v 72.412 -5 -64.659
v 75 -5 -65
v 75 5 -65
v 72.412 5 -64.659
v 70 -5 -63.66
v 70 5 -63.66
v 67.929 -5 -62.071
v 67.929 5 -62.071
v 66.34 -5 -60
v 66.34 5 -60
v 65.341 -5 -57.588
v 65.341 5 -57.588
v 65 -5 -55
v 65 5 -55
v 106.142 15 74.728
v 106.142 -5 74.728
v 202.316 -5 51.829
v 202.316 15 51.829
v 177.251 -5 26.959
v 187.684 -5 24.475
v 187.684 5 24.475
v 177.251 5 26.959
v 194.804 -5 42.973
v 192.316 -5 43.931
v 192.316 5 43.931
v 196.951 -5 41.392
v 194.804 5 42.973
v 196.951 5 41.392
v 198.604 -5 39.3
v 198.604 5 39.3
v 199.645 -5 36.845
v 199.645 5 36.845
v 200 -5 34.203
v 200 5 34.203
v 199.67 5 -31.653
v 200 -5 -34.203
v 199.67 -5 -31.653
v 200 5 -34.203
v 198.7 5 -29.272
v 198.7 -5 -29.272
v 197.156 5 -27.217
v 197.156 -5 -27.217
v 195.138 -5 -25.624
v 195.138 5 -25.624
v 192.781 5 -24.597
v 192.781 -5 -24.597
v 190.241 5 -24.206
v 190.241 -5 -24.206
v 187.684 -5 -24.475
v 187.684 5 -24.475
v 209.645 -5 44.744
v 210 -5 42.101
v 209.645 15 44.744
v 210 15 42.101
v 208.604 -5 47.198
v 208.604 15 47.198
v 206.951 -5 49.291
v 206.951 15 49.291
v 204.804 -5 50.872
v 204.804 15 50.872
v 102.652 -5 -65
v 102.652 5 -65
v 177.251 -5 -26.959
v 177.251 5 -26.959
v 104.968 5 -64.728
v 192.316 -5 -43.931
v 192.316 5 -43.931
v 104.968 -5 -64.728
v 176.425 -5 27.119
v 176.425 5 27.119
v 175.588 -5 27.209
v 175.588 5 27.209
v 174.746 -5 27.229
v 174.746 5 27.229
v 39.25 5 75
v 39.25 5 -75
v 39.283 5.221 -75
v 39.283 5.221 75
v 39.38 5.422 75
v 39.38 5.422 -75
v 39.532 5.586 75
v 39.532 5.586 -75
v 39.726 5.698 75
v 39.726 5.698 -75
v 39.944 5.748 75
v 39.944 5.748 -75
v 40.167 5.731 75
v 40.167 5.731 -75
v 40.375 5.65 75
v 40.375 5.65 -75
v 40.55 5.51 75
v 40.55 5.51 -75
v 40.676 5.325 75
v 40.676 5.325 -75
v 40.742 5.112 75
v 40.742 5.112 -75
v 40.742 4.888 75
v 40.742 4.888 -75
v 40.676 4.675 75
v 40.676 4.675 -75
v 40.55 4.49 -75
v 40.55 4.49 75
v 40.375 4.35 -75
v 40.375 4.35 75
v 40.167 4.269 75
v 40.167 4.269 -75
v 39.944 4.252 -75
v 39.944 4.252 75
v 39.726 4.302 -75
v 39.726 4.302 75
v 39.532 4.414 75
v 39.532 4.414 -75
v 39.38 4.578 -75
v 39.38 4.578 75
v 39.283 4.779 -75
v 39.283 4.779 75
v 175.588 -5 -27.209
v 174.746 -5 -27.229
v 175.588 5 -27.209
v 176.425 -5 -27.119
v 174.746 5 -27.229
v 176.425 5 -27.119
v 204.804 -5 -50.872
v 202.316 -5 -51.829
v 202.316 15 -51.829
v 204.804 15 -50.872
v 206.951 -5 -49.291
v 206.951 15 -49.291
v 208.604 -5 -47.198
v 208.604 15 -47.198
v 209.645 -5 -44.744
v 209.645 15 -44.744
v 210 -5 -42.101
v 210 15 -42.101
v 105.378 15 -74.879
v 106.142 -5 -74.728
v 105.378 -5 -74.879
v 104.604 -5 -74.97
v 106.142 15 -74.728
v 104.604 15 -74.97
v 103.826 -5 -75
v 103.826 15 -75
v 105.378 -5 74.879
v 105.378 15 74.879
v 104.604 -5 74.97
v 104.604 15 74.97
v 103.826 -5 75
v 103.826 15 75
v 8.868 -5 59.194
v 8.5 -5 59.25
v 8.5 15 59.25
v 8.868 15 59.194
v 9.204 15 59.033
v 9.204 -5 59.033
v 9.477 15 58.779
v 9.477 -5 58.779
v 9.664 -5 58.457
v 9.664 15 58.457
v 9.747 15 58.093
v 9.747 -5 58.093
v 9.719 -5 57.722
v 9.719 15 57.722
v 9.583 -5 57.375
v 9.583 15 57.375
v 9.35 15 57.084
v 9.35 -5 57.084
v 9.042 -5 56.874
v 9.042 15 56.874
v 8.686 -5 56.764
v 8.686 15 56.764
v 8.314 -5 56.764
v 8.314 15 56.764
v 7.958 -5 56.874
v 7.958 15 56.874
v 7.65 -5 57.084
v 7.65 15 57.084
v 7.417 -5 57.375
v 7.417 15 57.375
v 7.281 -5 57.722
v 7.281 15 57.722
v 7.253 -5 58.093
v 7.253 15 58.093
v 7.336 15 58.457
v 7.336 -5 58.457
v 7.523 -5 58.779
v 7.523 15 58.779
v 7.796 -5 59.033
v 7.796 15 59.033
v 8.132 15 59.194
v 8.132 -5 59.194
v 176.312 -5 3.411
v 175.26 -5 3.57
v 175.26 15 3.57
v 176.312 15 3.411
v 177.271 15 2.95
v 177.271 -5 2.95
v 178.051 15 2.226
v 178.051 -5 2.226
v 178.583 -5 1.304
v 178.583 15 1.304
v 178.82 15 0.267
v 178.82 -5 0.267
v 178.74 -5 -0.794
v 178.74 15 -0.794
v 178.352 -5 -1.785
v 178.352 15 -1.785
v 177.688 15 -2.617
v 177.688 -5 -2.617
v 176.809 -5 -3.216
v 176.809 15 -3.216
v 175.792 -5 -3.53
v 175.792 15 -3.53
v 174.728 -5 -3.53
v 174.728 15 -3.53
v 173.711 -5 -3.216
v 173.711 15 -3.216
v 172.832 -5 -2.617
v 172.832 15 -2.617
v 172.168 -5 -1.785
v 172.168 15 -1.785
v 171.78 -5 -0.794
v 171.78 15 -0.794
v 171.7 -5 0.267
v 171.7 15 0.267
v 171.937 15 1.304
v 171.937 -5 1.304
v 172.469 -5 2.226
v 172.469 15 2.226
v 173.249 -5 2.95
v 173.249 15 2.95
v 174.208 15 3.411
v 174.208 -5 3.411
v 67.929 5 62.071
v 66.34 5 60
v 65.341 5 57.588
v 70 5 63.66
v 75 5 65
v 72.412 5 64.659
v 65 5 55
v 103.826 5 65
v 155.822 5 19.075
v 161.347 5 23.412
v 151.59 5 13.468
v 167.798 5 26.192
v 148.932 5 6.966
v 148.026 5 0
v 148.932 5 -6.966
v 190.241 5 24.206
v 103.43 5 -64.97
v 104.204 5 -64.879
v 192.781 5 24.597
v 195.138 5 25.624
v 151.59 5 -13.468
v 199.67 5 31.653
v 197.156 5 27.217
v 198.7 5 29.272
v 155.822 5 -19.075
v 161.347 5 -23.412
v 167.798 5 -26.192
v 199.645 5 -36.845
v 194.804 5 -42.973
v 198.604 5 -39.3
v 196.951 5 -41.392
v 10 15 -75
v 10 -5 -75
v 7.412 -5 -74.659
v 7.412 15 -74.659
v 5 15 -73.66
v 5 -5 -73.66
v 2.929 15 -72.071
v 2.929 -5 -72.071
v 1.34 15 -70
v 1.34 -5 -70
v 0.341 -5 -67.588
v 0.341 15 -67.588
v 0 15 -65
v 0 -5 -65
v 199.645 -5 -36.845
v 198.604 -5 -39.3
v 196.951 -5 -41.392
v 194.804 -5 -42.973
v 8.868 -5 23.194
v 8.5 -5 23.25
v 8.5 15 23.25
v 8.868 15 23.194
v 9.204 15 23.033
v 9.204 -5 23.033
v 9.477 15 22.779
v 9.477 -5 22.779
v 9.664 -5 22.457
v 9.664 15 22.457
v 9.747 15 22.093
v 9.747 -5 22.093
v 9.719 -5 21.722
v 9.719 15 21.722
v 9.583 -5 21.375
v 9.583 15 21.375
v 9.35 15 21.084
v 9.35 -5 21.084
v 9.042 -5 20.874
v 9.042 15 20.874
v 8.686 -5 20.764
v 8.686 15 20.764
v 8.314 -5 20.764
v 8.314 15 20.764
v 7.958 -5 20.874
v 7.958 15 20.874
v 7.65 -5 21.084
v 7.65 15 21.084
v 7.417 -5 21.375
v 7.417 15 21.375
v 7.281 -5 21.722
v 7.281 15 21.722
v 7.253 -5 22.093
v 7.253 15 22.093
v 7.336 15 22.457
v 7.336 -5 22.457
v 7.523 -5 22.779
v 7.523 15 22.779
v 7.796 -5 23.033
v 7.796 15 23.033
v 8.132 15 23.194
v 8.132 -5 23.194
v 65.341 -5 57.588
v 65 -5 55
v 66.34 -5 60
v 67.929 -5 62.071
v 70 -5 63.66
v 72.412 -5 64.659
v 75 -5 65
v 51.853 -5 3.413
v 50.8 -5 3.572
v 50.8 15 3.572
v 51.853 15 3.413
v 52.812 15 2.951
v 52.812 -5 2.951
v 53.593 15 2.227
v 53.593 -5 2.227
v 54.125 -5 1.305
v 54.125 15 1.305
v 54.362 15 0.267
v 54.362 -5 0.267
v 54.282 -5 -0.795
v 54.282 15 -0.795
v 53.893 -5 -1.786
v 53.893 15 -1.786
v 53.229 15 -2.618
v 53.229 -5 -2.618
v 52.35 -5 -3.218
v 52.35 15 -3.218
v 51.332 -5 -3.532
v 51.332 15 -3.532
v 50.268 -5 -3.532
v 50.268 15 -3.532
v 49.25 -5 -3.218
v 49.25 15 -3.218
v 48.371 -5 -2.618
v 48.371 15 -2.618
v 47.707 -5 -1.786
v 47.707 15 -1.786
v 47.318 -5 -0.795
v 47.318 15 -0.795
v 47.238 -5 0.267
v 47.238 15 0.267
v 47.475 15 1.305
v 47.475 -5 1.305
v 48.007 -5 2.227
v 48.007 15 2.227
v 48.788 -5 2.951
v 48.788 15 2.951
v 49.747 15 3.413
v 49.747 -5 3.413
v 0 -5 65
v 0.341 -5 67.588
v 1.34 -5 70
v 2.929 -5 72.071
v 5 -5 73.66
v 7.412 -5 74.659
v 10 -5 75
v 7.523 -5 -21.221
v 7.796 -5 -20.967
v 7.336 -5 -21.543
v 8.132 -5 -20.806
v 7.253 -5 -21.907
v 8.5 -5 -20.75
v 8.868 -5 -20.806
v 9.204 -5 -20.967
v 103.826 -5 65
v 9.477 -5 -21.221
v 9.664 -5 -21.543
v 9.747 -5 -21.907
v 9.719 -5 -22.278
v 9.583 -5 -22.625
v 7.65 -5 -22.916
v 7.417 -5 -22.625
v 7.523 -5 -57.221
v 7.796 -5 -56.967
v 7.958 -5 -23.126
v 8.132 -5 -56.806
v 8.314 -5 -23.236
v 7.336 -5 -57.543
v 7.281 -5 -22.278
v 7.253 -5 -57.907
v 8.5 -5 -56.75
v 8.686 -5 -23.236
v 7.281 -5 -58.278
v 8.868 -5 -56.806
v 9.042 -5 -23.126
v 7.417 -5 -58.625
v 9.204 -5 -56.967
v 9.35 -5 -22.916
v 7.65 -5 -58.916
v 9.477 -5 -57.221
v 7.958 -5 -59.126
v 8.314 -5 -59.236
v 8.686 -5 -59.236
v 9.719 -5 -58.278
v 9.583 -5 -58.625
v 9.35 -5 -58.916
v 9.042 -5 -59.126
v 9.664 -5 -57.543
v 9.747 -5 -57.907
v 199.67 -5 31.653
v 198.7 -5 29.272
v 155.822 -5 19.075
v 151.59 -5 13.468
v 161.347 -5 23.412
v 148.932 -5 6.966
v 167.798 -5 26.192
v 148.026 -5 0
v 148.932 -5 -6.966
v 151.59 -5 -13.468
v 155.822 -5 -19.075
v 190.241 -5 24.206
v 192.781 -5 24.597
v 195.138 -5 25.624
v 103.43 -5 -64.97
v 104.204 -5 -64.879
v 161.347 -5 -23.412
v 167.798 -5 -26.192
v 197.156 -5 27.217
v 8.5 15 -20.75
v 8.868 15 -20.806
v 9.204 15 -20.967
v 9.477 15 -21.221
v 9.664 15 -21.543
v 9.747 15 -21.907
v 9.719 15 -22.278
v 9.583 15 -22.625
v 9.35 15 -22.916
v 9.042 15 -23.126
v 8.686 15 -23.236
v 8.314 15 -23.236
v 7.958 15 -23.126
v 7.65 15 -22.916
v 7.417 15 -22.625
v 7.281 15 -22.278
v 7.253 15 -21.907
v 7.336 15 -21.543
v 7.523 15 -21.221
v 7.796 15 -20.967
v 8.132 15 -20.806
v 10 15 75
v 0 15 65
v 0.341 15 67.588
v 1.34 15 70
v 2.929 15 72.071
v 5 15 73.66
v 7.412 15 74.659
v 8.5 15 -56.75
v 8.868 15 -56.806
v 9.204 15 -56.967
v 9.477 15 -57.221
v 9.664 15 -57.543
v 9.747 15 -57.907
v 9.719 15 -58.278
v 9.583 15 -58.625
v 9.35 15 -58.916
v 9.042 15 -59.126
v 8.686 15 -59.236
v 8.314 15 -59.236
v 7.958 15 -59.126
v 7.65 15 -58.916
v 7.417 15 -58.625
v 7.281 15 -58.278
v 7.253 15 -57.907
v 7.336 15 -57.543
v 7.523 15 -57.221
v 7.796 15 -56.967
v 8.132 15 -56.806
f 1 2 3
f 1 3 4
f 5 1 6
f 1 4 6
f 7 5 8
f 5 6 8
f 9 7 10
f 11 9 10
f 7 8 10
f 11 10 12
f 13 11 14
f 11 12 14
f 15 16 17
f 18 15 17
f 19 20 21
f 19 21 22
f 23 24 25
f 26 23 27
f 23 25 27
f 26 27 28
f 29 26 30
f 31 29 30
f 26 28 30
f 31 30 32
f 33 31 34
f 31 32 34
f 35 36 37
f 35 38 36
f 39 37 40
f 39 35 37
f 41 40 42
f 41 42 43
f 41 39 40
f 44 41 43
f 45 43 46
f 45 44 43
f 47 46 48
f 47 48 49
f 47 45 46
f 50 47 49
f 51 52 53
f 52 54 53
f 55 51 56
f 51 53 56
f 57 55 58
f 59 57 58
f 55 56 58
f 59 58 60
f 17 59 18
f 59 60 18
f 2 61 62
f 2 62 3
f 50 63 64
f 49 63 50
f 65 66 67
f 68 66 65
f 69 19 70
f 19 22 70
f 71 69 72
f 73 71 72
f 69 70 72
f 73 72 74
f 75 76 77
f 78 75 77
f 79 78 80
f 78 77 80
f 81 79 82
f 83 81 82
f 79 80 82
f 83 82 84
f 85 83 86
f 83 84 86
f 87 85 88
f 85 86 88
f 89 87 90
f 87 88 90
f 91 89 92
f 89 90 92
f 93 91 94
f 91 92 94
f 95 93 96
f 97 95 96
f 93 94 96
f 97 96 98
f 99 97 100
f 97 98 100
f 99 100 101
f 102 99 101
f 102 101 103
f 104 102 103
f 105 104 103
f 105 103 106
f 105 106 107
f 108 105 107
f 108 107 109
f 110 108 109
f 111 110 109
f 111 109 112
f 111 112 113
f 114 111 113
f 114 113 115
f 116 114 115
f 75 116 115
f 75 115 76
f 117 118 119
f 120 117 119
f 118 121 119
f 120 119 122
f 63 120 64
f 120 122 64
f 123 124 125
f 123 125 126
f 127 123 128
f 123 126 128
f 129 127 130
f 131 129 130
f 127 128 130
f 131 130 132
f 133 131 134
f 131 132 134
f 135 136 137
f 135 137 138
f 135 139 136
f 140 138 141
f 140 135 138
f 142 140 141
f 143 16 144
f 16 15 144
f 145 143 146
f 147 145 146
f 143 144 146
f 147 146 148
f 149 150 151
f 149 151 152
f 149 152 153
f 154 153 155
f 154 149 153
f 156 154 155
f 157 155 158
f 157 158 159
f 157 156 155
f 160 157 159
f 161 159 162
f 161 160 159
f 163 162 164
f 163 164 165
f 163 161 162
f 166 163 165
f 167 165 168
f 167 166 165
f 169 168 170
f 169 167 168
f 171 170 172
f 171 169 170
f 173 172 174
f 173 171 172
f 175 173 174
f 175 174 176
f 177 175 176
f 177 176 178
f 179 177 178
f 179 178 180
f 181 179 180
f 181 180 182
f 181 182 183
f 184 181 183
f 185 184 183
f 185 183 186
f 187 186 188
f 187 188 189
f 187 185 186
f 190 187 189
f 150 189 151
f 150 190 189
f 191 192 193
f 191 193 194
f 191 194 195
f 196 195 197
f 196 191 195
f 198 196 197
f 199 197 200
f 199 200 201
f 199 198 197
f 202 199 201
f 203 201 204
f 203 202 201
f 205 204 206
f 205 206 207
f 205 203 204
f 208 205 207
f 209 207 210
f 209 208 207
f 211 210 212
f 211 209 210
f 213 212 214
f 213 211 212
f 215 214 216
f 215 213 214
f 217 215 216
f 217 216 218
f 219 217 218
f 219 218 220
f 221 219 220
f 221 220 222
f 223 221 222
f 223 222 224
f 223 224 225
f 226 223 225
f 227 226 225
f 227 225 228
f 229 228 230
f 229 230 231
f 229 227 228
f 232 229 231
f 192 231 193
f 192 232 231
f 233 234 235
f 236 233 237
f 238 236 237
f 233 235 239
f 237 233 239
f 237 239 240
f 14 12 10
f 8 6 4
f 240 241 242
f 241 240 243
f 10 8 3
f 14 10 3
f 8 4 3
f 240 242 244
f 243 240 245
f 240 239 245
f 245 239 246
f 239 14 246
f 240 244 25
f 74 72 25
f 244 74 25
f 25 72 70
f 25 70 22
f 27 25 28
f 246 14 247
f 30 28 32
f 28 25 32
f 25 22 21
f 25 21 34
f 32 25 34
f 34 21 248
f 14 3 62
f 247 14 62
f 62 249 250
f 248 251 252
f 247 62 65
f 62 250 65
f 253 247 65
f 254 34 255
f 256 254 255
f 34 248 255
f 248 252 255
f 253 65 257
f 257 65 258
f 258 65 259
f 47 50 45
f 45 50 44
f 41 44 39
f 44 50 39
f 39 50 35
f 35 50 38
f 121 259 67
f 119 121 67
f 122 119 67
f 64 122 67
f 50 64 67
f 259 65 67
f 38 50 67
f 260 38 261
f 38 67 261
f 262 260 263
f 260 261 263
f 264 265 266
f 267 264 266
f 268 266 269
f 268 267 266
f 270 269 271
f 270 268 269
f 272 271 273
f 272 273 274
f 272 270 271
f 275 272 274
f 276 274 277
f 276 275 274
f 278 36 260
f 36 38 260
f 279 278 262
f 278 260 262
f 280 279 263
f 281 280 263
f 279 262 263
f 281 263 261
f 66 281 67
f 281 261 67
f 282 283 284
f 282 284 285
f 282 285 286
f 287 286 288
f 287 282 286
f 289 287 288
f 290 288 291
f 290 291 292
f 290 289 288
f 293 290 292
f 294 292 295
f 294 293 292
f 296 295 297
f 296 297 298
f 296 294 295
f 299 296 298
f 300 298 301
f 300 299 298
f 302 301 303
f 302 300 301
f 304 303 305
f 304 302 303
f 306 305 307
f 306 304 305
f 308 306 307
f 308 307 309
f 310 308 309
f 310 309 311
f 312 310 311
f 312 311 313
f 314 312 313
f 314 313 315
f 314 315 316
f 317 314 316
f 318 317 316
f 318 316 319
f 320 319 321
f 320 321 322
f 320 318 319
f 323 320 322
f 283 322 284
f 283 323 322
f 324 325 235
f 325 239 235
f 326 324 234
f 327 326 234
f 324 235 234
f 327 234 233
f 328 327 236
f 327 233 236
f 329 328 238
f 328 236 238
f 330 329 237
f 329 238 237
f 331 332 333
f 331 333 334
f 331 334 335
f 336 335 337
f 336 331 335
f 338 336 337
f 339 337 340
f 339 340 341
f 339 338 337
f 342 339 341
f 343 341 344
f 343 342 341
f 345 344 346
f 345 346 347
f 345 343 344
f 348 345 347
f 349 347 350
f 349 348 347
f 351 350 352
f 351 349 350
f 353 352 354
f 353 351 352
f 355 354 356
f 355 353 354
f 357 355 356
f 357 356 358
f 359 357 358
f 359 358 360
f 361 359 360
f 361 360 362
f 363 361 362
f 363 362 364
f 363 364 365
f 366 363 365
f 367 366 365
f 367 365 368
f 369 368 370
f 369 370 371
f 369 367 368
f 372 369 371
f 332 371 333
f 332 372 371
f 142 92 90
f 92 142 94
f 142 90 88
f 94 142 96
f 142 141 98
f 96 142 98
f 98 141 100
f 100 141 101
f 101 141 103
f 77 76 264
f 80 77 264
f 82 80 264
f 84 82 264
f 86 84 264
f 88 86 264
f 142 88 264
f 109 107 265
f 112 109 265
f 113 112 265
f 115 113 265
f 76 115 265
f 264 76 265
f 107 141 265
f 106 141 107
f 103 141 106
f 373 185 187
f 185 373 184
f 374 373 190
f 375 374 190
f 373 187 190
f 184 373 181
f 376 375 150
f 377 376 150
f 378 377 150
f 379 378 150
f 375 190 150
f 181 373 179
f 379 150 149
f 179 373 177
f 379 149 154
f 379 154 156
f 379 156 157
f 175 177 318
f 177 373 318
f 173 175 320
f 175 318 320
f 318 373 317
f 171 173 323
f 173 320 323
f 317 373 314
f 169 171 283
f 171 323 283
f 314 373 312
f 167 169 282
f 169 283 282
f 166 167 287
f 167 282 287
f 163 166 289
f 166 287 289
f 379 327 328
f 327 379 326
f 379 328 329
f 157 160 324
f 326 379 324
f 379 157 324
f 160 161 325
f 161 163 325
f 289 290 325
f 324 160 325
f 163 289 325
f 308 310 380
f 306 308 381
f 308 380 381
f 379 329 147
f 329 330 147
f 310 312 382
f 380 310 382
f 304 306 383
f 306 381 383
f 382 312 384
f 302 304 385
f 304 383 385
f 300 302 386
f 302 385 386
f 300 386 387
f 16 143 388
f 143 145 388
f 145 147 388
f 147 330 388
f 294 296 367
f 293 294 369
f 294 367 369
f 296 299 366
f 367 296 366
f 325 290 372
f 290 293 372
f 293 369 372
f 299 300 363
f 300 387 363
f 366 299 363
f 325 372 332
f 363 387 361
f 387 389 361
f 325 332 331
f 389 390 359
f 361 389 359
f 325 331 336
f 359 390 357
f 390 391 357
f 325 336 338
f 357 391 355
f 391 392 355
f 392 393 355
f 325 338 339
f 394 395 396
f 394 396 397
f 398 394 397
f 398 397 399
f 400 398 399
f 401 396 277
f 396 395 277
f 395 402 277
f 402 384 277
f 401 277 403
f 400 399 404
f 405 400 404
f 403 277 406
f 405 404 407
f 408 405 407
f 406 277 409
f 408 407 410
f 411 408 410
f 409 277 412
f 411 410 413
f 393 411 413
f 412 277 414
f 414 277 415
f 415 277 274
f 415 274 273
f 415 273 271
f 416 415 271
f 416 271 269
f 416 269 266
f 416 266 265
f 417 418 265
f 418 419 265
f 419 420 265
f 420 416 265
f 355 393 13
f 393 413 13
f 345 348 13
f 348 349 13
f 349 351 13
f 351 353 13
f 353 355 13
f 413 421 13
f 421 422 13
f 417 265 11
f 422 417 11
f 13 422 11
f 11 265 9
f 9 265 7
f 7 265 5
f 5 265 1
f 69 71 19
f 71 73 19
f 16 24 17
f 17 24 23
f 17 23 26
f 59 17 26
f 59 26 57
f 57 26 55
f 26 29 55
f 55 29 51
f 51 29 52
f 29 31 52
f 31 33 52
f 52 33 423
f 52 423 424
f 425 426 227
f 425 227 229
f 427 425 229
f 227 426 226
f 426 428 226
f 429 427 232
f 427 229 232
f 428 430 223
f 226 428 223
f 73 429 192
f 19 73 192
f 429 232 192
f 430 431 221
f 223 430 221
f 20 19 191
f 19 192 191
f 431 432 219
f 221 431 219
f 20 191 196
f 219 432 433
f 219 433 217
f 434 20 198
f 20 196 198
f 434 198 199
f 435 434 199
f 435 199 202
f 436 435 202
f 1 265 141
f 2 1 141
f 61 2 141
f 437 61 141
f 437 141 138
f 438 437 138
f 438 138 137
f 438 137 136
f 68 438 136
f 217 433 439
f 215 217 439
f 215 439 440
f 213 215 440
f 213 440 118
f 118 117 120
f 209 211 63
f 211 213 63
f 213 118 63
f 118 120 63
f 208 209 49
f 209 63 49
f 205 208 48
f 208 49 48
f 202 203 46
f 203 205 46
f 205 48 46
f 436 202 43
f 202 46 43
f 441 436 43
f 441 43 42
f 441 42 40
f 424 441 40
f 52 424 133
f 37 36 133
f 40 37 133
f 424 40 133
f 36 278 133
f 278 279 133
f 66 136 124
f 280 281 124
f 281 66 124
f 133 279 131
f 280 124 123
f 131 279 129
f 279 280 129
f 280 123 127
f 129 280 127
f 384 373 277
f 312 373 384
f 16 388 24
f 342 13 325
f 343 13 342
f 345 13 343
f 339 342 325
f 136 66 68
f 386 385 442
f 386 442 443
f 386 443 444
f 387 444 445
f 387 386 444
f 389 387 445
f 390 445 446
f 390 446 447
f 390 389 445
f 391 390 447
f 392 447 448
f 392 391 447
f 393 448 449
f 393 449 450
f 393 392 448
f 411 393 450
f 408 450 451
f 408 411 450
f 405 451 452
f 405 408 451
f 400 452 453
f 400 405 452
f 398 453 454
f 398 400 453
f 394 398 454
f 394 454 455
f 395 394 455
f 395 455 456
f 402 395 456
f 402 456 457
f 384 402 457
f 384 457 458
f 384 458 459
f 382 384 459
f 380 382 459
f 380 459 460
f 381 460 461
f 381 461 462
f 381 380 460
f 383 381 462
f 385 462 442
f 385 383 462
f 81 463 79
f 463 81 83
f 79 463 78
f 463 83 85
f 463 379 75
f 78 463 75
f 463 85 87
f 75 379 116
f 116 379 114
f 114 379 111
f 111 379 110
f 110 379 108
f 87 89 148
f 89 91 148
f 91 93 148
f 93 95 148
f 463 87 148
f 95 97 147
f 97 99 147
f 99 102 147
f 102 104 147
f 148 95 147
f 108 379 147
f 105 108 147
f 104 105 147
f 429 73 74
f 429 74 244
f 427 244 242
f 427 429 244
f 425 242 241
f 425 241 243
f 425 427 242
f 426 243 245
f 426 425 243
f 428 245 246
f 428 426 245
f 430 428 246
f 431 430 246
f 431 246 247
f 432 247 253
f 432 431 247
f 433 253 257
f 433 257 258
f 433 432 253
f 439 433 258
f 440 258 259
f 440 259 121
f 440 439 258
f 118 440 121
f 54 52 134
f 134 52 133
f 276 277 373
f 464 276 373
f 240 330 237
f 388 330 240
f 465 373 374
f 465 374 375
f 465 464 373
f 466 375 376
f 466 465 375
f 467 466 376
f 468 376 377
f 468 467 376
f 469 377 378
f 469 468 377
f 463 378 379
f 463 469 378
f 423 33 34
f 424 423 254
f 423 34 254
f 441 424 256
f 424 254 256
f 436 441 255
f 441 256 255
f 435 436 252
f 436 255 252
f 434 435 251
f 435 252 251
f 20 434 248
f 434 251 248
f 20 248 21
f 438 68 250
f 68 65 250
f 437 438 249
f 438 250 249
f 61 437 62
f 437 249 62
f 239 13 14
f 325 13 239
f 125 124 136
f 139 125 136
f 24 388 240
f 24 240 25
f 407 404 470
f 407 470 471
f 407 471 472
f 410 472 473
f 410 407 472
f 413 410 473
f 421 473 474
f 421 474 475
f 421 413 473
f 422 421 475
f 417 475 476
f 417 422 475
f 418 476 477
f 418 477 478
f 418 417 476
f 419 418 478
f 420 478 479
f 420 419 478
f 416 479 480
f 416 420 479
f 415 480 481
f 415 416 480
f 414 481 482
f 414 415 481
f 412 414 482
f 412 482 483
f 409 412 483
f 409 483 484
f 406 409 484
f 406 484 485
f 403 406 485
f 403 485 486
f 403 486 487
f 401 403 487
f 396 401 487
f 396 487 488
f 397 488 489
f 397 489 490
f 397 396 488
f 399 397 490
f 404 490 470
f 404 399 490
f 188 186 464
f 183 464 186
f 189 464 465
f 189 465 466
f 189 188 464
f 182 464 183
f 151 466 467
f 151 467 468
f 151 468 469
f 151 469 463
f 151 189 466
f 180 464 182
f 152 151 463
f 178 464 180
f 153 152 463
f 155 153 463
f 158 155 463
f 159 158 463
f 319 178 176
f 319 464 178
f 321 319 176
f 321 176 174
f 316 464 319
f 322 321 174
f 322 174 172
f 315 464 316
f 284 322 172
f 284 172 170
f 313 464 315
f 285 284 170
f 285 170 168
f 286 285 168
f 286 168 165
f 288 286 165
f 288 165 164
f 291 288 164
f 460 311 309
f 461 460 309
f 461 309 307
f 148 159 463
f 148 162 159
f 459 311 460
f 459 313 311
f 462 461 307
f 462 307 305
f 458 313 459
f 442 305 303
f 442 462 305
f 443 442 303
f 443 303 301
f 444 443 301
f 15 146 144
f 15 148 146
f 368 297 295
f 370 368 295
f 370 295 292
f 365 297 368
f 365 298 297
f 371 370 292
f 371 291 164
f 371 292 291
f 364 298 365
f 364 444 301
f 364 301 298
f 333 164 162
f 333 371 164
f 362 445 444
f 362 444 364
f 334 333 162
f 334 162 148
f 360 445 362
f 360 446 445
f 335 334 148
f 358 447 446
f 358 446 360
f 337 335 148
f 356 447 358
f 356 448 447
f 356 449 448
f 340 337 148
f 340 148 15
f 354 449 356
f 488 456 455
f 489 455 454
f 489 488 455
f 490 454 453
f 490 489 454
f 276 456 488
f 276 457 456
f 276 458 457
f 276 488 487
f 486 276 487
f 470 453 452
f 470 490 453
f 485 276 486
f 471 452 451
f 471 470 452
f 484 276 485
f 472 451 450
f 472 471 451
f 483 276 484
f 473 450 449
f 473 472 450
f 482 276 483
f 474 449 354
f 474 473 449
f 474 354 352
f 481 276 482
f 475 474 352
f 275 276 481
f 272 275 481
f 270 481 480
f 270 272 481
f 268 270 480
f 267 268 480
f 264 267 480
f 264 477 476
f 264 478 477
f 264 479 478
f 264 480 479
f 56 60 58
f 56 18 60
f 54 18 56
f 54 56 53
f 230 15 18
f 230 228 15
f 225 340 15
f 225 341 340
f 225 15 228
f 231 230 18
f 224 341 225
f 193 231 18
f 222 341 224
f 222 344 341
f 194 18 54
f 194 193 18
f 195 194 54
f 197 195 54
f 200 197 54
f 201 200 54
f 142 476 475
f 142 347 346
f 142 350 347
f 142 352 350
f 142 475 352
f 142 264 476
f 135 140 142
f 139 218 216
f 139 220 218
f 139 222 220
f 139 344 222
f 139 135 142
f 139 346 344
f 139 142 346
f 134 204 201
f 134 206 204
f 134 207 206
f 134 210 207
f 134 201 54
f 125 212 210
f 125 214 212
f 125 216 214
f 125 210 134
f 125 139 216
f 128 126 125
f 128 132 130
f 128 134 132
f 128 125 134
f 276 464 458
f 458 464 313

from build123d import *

# Parameters (mm, degrees)
RESSALTO_EXTRUS_O1_DEPTH      = 15
RESSALTO_EXTRUS_O1_DEPTH_BACK = 5
ESBO_O1_R                     = 3.571875
ESBO_O1_R_2                   = 3.57
ESBO_O1_R_3                   = 1.25
FILETE1_R                     = 10
CORTE_EXTRUS_O2_START         = -20
CORTE_EXTRUS_O2_DEPTH         = 10
FILETE2_R                     = 10
ESBO_O7_R                     = 0.75
CORTE_EXTRUS_O3_DEPTH         = 259.505319094


with BuildPart() as part:
    # Esboço1 → Ressalto-extrusão1 (new, two sides: drawn at the far end of the back side and taken through both)
    with BuildSketch(Plane(origin=(0, 0, 0), x_dir=(1, 0, 0), z_dir=(0, 1, 0)).offset(-RESSALTO_EXTRUS_O1_DEPTH_BACK)):
        Polygon((210, 50), (105, 75), (0, 75), (0, -75), (105, -75), (210, -50), align=None)
        with Locations(Location((50.8, 0, 0), (0, 0, 270))):
            Circle(ESBO_O1_R, mode=Mode.SUBTRACT)
        with Locations(Location((175.26, 0, 0), (0, 0, 270))):
            Circle(ESBO_O1_R_2, mode=Mode.SUBTRACT)
        with Locations(Location((8.5, -58, 0), (0, 0, 270))):
            Circle(ESBO_O1_R_3, mode=Mode.SUBTRACT)
        with Locations(Location((8.5, -22, 0), (0, 0, 270))):
            Circle(ESBO_O1_R_3, mode=Mode.SUBTRACT)
        with Locations(Location((8.5, 22, 0), (0, 0, 270))):
            Circle(ESBO_O1_R_3, mode=Mode.SUBTRACT)
        with Locations(Location((8.5, 58, 0), (0, 0, 270))):
            Circle(ESBO_O1_R_3, mode=Mode.SUBTRACT)
    extrude(amount=RESSALTO_EXTRUS_O1_DEPTH + RESSALTO_EXTRUS_O1_DEPTH_BACK)

    # Filete1
    filete1_edges = [part.edges().sort_by_distance(p)[0] for p in [
        (0, 5, 75),
        (0, 5, -75),
        (105, 5, -75),
        (210, 5, -50),
        (210, 5, 50),
        (105, 5, 75),
    ]]
    fillet(filete1_edges, radius=FILETE1_R)

    # Esboço6 → Corte-extrusão2 (cut)
    with BuildSketch(Plane(origin=(0, 15, 0), x_dir=(1, 0, 0), z_dir=(0, 1, 0)).offset(CORTE_EXTRUS_O2_START)):
        with BuildLine():
            Line((200, 21.542333602), (200, 42.101412788))
            Line((200, 42.101412788), (103.82593371, 65))
            Line((103.82593371, 65), (65, 65))
            Line((65, 65), (65, 0))
            Line((65, 0), (148.026211544, 0))
            ThreePointArc((148.026211544, 0), (156.322992627, 19.572148207), (176.158102637, 27.218975832))
            Line((176.158102637, 27.218975832), (200, 21.542333602))
        make_face()
        with BuildLine():
            Line((200, -42.101412788), (200, -21.542333602))
            Line((200, -21.542333602), (176.158102637, -27.218975832))
            ThreePointArc((176.158102637, -27.218975832), (156.322992627, -19.572148207), (148.026211544, 0))
            Line((148.026211544, 0), (65, 0))
            Line((65, 0), (65, -65))
            Line((65, -65), (103.82593371, -65))
            Line((103.82593371, -65), (200, -42.101412788))
        make_face()
    extrude(amount=CORTE_EXTRUS_O2_DEPTH, mode=Mode.SUBTRACT)

    # Filete2
    filete2_edges = [part.edges().sort_by_distance(p)[0] for p in [
        (65, 0, 65),
        (65, 0, -65),
        (103.82593371, 0, -65),
        (200, 0, -21.542333602),
        (176.158102637, 0, -27.218975832),
        (200, 0, -42.101412788),
        (200, 0, 42.101412788),
        (176.158102637, 0, 27.218975832),
        (200, 0, 21.542333602),
    ]]
    fillet(filete2_edges, radius=FILETE2_R - 0.0001)  # a hair under: the kernel refuses the full size

    # Esboço7 → Corte-extrusão3 (cut, through all)
    with BuildSketch(Plane(origin=(0, 0, -75), x_dir=(-1, 0, 0), z_dir=(0, 0, -1))):
        with Locations((-40, 5)):
            Circle(ESBO_O7_R)
    extrude(amount=-CORTE_EXTRUS_O3_DEPTH, mode=Mode.SUBTRACT)


solid = part.part
